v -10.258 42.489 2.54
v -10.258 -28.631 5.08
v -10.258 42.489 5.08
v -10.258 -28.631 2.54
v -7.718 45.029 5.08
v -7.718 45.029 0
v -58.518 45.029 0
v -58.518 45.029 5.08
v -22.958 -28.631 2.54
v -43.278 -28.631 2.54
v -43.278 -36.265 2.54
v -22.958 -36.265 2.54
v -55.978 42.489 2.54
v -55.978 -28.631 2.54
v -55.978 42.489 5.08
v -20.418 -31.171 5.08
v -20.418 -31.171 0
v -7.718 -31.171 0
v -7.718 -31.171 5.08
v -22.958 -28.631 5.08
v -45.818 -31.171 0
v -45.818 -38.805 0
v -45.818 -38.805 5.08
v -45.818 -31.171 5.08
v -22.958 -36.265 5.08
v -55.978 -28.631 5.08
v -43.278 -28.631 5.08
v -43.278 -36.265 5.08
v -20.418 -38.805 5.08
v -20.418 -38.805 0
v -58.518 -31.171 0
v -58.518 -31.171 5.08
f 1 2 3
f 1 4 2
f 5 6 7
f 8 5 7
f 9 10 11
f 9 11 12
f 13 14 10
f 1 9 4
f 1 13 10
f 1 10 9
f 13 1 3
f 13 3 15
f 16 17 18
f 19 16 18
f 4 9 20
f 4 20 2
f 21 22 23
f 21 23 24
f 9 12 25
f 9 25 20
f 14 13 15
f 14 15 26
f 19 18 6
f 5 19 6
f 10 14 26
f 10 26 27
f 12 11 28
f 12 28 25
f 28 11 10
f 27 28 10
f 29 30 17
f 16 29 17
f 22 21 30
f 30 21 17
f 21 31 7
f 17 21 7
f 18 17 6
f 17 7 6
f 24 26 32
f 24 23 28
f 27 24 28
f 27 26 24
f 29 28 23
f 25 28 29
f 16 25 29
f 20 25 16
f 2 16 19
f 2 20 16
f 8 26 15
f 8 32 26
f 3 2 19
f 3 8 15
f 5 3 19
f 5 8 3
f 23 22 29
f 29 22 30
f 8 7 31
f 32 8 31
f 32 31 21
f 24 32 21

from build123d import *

# Parameters (mm, degrees)
F0_W     = 25.4
F0_H     = 7.634085685
F1_DEPTH = 5.08
F2_T     = -2.54


with BuildPart() as f1:
    # F0 (on Top) → F1 (new body)
    with BuildSketch(Plane.XY):
        Polygon((-7.7176965407, 45.0293049932), (-58.5176965407, 45.0293049932), (-58.5176965407, -31.1706950068), (-45.8176965407, -31.1706950068), (-20.4176965407, -31.1706950068), (-7.7176965407, -31.1706950068), align=None)
        with Locations((-33.1176965407, -34.9877378494)):
            Rectangle(F0_W, F0_H)
    extrude(amount=F1_DEPTH)

    # F2
    f2_openings = [f1.faces().sort_by_distance(p)[0] for p in [
        (-33.117697, 4.929742, 5.08),
    ]]
    offset(amount=F2_T, openings=f2_openings, kind=Kind.INTERSECTION)


solid = f1.part
